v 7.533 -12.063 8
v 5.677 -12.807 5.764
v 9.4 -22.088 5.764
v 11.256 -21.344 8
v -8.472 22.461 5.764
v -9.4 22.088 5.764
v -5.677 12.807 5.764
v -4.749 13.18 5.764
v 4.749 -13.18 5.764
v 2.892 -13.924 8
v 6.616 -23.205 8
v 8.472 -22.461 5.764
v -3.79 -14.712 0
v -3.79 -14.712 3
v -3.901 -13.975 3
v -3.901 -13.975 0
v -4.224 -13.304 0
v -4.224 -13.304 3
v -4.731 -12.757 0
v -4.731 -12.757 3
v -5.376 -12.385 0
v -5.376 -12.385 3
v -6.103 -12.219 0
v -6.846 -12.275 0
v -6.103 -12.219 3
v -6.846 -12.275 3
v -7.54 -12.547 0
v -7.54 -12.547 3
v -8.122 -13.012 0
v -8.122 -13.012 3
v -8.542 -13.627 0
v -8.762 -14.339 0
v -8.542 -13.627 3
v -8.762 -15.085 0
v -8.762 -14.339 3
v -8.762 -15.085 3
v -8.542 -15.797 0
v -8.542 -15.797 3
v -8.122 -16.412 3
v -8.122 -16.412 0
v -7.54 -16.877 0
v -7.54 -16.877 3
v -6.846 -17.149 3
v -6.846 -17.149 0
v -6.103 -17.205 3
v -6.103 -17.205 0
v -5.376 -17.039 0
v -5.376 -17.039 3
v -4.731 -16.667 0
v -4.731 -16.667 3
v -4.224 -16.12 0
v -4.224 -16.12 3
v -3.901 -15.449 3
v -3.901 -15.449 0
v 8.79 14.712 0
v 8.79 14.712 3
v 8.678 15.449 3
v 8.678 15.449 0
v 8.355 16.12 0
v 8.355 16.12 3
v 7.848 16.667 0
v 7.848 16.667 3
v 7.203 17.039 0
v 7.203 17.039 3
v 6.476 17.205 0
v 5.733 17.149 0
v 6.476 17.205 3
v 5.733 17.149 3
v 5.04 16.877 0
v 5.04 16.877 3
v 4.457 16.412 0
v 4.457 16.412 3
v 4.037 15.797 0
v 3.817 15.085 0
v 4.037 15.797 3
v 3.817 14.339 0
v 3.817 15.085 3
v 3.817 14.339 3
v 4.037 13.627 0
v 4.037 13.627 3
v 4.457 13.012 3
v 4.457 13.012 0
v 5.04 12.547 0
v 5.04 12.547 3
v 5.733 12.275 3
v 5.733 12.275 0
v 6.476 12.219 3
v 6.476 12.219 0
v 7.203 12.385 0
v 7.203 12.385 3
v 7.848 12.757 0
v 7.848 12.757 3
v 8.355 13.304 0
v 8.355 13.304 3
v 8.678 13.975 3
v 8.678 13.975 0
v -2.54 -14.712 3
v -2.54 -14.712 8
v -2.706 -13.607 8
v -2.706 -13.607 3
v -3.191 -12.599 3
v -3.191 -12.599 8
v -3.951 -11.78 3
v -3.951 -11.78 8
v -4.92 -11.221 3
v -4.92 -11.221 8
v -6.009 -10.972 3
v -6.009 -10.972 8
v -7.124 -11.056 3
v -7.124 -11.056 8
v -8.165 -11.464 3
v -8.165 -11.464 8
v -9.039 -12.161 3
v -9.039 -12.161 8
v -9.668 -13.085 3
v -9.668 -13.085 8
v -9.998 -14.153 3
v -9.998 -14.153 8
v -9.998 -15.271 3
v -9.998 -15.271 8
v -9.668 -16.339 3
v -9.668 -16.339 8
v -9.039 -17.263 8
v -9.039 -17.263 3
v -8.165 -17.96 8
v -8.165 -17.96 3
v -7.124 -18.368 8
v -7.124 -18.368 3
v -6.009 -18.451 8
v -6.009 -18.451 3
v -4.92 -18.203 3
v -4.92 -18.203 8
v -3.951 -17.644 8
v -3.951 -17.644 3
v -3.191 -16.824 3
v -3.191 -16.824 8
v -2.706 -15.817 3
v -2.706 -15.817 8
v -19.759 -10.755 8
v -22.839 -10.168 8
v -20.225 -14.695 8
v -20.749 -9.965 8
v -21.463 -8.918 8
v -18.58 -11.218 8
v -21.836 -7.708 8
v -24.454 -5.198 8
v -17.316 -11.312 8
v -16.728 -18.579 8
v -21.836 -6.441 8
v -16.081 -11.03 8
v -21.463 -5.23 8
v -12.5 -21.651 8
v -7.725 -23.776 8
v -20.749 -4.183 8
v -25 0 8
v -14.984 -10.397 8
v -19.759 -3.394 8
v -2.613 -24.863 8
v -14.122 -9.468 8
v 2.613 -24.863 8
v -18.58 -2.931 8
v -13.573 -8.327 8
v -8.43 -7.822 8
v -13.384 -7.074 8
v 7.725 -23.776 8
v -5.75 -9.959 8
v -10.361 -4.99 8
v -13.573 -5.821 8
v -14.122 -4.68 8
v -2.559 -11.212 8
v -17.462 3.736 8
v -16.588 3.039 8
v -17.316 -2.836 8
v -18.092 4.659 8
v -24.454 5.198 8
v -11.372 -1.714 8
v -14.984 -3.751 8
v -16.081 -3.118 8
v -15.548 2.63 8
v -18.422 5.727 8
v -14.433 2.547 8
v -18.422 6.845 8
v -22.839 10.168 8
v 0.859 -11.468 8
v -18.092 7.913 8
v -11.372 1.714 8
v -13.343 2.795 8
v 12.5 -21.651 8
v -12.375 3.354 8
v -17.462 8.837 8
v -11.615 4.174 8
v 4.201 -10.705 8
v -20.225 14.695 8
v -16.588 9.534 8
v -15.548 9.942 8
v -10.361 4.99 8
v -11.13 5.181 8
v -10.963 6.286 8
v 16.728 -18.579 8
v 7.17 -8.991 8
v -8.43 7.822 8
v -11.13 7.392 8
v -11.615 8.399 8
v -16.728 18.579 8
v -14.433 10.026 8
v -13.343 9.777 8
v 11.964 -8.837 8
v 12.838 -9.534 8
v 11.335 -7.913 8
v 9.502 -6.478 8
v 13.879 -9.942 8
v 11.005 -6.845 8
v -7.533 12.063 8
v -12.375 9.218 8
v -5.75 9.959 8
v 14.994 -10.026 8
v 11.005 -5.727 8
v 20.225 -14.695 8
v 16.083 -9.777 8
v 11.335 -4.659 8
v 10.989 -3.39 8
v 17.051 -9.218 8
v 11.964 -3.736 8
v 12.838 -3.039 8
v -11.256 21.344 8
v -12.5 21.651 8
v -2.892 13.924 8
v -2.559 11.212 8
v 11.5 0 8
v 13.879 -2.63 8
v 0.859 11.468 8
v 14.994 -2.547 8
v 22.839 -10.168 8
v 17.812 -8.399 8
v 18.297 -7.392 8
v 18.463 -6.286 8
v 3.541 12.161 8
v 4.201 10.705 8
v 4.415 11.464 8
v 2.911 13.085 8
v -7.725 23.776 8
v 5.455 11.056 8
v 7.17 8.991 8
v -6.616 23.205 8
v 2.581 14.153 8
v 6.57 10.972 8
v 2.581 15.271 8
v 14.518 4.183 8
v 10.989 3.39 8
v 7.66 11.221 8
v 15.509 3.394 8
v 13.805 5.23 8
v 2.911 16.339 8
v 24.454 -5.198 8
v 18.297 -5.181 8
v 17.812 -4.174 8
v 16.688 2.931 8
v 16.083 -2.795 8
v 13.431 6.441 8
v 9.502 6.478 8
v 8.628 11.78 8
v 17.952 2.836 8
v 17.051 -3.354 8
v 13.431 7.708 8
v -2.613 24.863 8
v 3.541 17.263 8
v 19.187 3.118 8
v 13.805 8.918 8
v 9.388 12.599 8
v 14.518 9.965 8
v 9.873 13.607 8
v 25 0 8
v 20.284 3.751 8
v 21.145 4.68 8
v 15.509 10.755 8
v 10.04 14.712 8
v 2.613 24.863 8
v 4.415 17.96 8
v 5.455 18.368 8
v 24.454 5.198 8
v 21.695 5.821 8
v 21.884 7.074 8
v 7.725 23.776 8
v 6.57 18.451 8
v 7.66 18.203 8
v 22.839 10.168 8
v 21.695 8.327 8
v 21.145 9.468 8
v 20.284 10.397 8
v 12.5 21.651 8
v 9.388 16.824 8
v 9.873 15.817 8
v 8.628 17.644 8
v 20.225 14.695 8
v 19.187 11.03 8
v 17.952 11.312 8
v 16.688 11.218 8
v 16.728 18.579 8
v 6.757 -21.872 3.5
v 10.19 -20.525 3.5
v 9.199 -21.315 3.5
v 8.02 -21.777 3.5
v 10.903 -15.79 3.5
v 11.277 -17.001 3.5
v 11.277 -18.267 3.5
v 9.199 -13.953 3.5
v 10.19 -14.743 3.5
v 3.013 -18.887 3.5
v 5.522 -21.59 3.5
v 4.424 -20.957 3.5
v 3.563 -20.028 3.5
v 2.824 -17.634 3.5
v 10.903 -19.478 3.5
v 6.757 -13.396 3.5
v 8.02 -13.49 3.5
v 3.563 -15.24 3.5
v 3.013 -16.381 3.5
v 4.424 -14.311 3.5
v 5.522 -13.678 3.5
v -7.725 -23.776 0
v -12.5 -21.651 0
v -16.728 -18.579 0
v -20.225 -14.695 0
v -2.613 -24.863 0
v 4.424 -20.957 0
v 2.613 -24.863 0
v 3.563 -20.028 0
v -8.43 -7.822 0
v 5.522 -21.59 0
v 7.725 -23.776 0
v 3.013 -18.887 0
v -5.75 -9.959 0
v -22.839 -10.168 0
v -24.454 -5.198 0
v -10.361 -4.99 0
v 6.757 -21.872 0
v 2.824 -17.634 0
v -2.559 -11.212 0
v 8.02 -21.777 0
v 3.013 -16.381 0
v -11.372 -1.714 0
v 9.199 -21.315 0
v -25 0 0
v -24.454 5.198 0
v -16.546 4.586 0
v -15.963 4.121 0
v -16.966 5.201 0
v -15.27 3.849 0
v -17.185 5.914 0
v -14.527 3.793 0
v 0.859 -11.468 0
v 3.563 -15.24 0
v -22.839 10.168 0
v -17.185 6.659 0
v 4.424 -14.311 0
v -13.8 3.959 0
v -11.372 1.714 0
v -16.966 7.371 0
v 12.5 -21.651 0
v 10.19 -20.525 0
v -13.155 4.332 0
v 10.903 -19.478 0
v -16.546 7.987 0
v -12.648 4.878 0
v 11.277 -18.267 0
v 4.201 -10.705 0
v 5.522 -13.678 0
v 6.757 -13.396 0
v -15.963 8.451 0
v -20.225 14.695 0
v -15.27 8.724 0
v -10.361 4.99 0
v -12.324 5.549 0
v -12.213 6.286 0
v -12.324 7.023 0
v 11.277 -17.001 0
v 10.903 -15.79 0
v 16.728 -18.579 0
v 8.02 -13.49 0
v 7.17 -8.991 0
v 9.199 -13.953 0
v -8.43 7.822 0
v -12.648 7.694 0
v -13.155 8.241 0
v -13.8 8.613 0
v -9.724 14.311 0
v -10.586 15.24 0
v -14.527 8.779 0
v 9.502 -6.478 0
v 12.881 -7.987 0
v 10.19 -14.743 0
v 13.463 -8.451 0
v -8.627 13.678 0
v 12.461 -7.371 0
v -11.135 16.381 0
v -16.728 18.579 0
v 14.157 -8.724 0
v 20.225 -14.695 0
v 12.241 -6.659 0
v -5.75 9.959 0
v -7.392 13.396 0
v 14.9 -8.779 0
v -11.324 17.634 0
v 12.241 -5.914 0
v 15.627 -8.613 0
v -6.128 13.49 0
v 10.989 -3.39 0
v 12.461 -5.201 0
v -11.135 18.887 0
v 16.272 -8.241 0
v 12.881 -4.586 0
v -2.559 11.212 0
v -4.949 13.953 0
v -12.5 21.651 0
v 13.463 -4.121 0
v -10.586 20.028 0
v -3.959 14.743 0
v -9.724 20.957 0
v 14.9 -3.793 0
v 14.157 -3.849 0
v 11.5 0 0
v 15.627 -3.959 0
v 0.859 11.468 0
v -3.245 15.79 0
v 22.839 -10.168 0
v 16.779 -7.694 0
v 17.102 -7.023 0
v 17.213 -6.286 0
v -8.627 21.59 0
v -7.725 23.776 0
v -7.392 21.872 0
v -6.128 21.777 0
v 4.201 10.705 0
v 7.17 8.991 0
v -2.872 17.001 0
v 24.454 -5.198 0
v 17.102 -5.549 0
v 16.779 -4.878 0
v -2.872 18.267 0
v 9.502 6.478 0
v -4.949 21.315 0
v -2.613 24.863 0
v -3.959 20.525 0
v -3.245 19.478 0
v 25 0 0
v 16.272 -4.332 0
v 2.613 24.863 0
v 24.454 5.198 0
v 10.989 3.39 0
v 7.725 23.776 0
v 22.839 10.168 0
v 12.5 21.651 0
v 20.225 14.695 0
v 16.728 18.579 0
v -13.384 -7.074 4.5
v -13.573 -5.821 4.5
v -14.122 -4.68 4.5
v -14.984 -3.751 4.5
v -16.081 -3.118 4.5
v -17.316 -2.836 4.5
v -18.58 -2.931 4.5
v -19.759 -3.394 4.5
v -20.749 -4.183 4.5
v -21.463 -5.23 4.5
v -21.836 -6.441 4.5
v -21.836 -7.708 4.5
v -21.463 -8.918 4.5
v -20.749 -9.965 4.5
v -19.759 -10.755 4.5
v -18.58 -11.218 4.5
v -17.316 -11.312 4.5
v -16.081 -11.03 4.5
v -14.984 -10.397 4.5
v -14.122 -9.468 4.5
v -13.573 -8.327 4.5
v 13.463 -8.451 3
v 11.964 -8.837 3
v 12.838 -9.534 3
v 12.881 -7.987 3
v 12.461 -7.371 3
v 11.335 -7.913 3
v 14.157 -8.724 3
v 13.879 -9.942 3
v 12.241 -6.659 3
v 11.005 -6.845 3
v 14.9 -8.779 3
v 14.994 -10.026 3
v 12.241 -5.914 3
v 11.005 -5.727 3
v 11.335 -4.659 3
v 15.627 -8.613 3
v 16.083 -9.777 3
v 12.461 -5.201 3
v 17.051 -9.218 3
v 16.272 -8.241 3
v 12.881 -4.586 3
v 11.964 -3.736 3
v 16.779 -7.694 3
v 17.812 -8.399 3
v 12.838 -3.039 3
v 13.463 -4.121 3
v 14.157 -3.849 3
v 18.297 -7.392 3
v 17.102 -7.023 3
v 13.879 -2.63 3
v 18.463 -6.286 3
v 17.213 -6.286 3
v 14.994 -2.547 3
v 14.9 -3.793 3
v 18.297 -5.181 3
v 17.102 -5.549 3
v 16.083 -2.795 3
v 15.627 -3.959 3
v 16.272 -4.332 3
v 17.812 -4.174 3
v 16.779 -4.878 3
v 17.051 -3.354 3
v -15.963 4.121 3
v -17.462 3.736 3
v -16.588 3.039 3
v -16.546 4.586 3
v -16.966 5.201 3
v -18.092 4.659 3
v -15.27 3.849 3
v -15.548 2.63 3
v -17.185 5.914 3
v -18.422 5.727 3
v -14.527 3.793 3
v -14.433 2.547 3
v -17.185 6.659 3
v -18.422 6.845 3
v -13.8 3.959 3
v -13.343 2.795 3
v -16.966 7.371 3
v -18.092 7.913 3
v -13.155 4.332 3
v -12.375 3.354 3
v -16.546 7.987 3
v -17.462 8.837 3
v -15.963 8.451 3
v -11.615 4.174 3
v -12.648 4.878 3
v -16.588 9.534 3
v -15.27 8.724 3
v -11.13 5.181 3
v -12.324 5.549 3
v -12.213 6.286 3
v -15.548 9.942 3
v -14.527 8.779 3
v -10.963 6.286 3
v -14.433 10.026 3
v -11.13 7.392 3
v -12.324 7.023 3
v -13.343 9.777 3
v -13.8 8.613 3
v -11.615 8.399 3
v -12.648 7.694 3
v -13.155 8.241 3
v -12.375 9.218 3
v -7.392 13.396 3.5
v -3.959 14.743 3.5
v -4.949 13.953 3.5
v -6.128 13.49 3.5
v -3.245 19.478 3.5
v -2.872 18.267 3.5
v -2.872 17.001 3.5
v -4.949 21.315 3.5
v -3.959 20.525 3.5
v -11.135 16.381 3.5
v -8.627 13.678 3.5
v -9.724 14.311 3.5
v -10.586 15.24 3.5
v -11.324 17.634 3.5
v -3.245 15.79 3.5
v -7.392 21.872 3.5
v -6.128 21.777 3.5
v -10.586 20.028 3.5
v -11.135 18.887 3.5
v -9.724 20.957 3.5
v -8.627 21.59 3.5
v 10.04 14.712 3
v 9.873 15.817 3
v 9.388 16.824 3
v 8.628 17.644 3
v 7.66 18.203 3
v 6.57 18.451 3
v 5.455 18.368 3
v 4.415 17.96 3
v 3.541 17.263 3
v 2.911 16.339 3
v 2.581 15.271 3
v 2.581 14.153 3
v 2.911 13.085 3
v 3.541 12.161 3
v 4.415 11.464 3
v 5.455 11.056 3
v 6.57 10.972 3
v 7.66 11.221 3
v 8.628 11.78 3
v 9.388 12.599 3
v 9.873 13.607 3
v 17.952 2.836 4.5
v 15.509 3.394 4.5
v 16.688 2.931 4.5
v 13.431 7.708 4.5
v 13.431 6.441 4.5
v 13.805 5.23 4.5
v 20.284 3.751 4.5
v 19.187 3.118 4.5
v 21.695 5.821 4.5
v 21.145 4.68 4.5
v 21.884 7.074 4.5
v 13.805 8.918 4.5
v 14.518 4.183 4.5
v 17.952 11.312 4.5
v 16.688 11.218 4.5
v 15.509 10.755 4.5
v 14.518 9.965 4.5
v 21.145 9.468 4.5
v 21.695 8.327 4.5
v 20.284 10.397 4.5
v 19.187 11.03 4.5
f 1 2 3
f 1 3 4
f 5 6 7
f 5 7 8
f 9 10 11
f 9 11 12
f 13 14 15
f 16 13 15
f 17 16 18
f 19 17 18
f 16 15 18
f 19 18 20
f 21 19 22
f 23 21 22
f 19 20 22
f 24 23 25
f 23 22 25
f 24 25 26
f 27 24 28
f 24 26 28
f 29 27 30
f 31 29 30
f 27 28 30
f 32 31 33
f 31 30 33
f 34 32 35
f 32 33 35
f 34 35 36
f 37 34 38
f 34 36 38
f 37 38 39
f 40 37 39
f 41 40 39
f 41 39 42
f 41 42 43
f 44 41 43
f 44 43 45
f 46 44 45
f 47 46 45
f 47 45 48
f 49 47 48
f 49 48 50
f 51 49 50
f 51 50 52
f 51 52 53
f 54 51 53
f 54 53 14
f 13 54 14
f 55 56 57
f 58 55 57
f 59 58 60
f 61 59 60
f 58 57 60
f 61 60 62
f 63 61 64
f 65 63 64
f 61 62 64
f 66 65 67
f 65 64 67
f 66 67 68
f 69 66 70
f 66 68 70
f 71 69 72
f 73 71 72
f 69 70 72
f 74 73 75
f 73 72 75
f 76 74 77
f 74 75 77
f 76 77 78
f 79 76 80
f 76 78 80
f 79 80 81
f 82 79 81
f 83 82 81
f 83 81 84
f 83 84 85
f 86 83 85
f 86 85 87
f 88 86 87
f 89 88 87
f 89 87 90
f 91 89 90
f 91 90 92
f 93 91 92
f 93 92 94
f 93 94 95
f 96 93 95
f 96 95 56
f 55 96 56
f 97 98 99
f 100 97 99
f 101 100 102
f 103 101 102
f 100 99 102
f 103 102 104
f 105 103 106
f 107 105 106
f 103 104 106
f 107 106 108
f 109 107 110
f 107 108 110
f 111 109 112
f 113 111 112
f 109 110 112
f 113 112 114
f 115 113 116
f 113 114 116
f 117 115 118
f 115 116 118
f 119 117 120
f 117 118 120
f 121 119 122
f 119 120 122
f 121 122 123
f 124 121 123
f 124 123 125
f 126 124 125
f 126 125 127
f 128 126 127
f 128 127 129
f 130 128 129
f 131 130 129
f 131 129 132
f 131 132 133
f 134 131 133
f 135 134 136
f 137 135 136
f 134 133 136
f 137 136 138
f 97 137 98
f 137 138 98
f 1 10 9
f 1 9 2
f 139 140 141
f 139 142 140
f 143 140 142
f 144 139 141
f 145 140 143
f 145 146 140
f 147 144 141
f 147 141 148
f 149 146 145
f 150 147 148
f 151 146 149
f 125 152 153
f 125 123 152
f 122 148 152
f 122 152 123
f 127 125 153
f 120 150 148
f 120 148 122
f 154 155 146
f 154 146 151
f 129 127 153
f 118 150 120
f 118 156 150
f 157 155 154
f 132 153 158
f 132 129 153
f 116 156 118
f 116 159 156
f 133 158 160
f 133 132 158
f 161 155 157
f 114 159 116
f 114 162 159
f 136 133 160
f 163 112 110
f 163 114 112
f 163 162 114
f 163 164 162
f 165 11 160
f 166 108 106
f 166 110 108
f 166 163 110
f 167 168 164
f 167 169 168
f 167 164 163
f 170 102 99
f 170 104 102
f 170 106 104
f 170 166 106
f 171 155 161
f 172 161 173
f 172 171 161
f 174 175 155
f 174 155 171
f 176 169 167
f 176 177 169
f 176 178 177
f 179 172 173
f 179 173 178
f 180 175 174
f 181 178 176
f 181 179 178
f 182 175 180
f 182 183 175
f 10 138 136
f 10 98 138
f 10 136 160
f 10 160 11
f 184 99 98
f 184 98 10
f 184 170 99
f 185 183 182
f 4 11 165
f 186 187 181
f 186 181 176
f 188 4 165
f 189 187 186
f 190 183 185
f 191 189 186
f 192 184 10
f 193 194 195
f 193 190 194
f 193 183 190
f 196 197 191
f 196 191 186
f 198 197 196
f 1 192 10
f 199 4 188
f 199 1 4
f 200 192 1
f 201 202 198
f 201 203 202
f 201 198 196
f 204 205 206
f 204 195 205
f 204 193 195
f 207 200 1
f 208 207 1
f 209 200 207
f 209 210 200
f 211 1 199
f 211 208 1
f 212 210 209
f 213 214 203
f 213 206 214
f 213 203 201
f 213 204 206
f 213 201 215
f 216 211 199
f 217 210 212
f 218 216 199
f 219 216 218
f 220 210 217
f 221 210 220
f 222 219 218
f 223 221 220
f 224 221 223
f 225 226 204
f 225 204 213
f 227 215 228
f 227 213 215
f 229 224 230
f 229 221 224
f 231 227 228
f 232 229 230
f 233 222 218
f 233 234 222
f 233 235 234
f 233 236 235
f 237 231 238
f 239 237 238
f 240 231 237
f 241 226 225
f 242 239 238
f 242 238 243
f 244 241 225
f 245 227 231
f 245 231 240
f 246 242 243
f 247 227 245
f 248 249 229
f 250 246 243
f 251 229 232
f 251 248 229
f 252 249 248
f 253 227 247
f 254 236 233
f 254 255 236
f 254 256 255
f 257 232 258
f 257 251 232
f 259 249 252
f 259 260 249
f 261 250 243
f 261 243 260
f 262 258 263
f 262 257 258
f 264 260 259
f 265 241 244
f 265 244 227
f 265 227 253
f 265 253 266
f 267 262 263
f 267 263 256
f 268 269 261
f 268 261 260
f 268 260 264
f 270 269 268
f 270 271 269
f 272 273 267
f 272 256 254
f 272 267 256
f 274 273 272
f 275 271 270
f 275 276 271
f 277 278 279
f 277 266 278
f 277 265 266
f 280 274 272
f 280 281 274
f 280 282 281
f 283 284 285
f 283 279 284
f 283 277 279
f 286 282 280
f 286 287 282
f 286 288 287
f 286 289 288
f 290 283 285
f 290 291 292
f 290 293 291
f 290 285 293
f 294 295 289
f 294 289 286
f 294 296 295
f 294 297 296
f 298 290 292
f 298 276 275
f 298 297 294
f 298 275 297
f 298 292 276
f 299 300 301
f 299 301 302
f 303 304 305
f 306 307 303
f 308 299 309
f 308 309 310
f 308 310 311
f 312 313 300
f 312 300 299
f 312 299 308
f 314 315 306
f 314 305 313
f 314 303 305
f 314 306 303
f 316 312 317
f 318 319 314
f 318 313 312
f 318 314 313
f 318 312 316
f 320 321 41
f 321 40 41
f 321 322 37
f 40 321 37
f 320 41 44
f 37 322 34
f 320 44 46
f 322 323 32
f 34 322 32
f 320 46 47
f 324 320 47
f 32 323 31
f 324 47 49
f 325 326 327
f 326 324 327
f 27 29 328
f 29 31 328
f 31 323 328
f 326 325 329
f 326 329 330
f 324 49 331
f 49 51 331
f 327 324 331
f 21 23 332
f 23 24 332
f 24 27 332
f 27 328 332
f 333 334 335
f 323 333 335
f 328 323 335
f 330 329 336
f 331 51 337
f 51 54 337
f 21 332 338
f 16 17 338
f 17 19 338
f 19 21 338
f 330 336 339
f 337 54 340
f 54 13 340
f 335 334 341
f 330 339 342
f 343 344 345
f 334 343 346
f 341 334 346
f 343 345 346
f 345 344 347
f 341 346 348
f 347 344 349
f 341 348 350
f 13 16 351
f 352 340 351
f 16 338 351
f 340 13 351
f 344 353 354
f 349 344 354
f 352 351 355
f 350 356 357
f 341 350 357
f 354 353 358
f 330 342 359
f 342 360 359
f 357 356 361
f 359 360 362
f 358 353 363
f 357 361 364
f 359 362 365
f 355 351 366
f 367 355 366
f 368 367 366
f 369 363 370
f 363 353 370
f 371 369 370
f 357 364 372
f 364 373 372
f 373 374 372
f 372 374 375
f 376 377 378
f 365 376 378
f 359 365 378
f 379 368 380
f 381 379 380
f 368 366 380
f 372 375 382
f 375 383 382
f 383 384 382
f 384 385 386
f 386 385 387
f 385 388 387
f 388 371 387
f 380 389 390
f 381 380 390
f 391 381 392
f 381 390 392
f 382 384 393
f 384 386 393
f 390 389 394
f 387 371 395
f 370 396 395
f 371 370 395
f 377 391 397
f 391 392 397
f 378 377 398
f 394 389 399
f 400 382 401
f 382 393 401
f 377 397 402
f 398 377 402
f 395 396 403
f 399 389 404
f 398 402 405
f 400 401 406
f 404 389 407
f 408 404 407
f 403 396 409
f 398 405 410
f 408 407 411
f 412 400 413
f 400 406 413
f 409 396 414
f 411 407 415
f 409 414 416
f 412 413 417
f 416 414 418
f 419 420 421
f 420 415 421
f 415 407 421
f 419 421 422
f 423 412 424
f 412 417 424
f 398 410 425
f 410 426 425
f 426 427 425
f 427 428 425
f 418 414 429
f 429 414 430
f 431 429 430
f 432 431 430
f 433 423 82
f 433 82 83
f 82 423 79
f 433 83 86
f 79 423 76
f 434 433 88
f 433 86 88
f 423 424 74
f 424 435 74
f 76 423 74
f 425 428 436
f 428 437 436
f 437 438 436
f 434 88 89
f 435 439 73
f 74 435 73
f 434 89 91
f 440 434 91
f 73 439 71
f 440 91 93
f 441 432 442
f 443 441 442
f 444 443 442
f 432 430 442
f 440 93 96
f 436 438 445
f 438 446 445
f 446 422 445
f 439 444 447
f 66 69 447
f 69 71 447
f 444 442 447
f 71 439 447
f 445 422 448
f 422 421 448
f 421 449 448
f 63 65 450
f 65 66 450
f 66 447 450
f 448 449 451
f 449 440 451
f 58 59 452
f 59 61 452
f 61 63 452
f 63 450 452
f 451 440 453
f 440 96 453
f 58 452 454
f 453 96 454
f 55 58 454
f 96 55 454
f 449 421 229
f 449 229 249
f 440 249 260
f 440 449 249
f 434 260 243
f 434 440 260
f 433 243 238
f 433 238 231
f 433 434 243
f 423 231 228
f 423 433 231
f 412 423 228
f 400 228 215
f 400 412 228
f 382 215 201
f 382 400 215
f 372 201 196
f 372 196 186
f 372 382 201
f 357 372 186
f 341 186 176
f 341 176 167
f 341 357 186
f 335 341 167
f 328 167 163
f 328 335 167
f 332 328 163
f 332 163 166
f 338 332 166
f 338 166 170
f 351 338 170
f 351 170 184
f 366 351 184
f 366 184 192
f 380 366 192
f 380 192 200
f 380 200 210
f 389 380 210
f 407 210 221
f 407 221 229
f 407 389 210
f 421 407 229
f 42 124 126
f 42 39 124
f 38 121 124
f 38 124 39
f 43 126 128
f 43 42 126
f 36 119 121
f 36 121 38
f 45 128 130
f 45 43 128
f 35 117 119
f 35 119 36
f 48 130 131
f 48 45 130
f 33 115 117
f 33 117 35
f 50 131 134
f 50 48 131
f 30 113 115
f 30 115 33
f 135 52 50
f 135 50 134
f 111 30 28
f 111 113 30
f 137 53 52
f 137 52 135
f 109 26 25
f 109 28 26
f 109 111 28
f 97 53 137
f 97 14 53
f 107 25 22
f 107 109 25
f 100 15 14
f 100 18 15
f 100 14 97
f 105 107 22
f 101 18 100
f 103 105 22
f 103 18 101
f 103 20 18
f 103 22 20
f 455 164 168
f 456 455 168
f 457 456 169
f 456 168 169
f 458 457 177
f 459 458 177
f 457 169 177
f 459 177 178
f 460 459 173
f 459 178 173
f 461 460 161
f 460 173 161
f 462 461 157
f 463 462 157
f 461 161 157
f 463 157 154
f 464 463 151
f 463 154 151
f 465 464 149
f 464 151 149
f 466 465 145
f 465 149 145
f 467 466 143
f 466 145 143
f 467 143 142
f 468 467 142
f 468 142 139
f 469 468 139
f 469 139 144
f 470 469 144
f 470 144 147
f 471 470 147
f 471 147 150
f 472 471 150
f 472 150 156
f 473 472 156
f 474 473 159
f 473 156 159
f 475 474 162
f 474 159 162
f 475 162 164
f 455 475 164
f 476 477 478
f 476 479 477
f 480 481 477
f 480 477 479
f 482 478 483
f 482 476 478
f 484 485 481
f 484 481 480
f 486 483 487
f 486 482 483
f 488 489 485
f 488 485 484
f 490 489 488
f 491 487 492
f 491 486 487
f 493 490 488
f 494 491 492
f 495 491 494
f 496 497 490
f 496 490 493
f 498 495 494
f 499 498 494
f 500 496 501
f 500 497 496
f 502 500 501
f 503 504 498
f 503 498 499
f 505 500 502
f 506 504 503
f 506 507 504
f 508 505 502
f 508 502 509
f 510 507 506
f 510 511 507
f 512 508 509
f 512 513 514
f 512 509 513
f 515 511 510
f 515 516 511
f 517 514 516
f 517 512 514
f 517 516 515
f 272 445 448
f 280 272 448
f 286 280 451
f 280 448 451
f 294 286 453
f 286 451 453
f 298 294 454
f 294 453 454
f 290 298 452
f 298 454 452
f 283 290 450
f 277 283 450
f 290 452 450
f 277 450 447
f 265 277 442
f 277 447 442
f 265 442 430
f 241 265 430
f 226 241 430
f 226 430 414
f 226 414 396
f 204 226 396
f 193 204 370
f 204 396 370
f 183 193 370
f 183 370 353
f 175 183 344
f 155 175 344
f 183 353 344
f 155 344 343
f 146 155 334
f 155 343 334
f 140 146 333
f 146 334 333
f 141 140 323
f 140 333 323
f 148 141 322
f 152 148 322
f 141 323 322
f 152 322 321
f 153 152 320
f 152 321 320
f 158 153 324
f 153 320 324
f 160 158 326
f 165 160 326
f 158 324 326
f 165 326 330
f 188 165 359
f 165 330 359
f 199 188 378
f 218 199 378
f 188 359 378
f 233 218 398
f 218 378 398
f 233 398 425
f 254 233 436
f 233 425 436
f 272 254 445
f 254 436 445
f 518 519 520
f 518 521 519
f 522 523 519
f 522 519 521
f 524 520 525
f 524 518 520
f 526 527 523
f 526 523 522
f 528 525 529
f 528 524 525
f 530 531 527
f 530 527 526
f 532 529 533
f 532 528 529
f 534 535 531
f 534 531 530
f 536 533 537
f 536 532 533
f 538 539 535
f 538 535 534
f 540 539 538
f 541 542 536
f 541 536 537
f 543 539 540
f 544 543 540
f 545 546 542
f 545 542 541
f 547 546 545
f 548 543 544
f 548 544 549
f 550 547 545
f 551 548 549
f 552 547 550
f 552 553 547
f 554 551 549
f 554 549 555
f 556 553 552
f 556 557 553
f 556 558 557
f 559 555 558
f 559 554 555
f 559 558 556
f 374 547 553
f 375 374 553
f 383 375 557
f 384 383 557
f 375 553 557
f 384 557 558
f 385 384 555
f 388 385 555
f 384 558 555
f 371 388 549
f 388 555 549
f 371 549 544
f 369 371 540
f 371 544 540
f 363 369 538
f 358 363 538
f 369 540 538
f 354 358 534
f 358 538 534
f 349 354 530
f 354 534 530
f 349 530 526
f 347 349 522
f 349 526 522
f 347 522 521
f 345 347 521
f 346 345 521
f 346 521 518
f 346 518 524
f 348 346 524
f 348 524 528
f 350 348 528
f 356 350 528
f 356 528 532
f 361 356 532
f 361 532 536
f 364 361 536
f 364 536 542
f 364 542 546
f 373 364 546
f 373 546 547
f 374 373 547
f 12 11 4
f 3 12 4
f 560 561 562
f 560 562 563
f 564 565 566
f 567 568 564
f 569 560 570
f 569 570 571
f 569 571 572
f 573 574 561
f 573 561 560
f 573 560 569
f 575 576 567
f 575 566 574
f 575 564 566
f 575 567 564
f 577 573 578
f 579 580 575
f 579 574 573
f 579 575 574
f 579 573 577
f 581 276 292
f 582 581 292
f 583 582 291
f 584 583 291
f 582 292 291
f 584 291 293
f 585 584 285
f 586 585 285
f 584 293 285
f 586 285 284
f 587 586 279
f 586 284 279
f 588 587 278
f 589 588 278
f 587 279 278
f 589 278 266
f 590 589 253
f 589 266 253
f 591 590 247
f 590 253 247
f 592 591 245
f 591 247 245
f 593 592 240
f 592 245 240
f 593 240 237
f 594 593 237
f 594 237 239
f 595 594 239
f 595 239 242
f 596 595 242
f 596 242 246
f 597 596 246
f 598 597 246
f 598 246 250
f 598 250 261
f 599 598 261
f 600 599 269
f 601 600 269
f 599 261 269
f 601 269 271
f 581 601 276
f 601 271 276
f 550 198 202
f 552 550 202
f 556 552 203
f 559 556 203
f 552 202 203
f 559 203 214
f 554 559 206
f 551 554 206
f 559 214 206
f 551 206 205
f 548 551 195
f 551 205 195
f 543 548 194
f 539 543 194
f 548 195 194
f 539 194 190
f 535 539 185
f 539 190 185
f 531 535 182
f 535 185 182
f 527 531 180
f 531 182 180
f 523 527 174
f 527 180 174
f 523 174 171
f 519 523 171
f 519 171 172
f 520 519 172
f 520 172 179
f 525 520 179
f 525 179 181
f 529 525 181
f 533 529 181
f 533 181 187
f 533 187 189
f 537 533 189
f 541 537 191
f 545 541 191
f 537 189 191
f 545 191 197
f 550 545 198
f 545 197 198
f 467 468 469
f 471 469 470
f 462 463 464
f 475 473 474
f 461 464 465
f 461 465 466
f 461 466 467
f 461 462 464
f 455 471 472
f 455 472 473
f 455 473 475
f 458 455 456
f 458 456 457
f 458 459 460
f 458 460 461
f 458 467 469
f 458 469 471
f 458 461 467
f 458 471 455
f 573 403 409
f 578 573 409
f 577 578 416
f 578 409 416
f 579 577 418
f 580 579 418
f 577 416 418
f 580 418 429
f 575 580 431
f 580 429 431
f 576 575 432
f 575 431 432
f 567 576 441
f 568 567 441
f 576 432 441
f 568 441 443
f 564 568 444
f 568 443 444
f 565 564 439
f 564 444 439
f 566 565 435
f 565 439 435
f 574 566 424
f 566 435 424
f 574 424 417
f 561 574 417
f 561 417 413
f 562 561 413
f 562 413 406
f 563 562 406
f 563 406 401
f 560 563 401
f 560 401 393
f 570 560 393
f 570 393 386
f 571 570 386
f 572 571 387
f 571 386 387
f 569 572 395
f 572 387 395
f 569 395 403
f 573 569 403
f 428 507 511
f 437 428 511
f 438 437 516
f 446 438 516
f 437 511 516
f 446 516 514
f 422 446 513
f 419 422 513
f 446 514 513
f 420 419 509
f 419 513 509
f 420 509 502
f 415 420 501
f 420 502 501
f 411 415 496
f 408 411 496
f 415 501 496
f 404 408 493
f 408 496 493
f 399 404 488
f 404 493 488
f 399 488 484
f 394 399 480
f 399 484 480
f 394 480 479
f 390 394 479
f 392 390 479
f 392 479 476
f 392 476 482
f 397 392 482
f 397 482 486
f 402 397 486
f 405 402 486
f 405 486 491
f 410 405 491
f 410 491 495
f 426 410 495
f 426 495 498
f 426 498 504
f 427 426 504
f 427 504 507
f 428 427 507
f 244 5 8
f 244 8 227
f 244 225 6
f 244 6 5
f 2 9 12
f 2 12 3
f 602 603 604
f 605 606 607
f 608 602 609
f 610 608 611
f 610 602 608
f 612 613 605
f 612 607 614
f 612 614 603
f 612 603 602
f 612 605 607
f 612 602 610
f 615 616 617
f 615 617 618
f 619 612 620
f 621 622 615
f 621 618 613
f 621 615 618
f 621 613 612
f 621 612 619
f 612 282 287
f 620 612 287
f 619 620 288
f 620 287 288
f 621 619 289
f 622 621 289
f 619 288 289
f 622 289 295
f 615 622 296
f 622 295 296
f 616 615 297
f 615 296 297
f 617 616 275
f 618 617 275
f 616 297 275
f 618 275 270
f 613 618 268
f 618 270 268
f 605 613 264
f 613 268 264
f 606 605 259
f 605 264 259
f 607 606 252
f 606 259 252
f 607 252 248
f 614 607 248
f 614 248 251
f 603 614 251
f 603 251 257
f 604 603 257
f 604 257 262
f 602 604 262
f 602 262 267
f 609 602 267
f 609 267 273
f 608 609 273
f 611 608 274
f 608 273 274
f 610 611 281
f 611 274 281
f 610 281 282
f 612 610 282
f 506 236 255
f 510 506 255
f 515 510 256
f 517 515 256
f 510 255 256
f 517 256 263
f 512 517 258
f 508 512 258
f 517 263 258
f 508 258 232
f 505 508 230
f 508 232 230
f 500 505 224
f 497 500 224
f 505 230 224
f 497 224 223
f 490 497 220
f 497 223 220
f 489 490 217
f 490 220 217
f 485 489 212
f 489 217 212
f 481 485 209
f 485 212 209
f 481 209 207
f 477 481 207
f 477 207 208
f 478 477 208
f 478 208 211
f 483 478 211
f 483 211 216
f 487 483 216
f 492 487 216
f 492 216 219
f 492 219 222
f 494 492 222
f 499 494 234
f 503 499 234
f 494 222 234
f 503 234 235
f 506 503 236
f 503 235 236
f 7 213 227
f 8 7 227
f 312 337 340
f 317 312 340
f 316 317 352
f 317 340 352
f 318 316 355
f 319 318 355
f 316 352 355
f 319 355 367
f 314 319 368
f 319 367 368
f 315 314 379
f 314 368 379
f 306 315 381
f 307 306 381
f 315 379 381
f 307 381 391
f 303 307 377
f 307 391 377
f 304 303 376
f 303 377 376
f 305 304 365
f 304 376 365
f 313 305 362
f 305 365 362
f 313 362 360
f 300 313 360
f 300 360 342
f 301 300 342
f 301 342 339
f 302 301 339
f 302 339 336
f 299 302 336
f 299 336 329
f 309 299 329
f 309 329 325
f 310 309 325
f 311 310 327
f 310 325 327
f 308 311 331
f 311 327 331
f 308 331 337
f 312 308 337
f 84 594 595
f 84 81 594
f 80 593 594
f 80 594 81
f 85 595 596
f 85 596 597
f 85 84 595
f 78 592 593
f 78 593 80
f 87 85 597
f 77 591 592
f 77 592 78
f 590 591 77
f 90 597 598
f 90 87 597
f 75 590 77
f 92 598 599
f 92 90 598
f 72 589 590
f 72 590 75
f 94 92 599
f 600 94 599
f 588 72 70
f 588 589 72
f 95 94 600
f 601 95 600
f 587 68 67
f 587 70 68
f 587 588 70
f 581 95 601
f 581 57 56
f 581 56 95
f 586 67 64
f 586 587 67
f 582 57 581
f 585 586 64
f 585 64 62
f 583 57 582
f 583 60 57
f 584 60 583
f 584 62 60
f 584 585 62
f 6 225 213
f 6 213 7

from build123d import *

# Parameters (mm, degrees)
ESQUISSE1_R             = 25
ESQUISSE1_R_2           = 11.5
BOSS_EXTRU_1_DEPTH      = 8
ESQUISSE2_R             = 2.5
ENL_V_MAT_EXTRU_1_DEPTH = 37.249137921
ESQUISSE4_R             = 3.75
ENL_V_MAT_EXTRU_2_DEPTH = 5
ENL_V_START             = -14
ENL_V_MAT_EXTRU_7_DEPTH = 10
ESQUISSE10_R            = 4.25
ENL_V_MAT_EXTRU_5_DEPTH = 3.5
ESQUISSE12_R            = 4.25
ENL_V_MAT_EXTRU_6_DEPTH = 3.5


with BuildPart() as part:
    # Esquisse1 → Boss.-Extru.1 (new body)
    with BuildSketch(Plane.XY):
        Circle(ESQUISSE1_R)
        Circle(ESQUISSE1_R_2, mode=Mode.SUBTRACT)
    extrude(amount=BOSS_EXTRU_1_DEPTH)

    # Esquisse2 → Enlèv. mat.-Extru.1 (cut, through all)
    with BuildSketch(Plane.XY.offset(8)):
        with Locations((-14.713385832, 6.286197369)):
            Circle(ESQUISSE2_R)
        with Locations((6.28955657, 14.711950182)):
            Circle(ESQUISSE2_R)
        with Locations((14.713385832, -6.286197369)):
            Circle(ESQUISSE2_R)
        with Locations((-6.28955657, -14.711950182)):
            Circle(ESQUISSE2_R)
    extrude(amount=-ENL_V_MAT_EXTRU_1_DEPTH, mode=Mode.SUBTRACT)

    # Esquisse4 → Enlèv. mat.-Extru.2 (cut)
    with BuildSketch(Plane.XY.offset(8)):
        with Locations((-6.28955657, -14.711950182)):
            Circle(ESQUISSE4_R)
        with Locations((14.713385832, -6.286197369)):
            Circle(ESQUISSE4_R)
        with Locations((6.28955657, 14.711950182)):
            Circle(ESQUISSE4_R)
        with Locations((-14.713385832, 6.286197369)):
            Circle(ESQUISSE4_R)
    extrude(amount=-ENL_V_MAT_EXTRU_2_DEPTH, mode=Mode.SUBTRACT)

    # Esquisse13 → Enlèv. mat.-Extru.7 (cut)
    with BuildSketch(Plane(origin=(0, 0, 0), x_dir=(-0.9281017411356184, -0.3723266819622707, 0), z_dir=(-0.3723266819622707, 0.9281017411356184, 0)).offset(ENL_V_START)):
        Polygon((-2.5, 8), (2.5, 8), (0.5, 5.763932023), (-0.5, 5.763932023), align=None)
    enl_v_mat_extru_7 = extrude(amount=-ENL_V_MAT_EXTRU_7_DEPTH, mode=Mode.SUBTRACT)

    # Esquisse10 → Enlèv. mat.-Extru.5 (cut)
    with BuildSketch(Plane(origin=(0, 0, 0), x_dir=(-1, 0, 0), z_dir=(0, 0, -1))):
        with Locations((7.074206957, 17.633933082)):
            Circle(ESQUISSE10_R)
        with Locations((-7.074206957, -17.633933082)):
            Circle(ESQUISSE10_R)
    extrude(amount=-ENL_V_MAT_EXTRU_5_DEPTH, mode=Mode.SUBTRACT)

    # Esquisse12 → Enlèv. mat.-Extru.6 (cut)
    with BuildSketch(Plane.XY.offset(8)):
        with Locations((17.633933082, 7.074206957)):
            Circle(ESQUISSE12_R)
        with Locations((-17.633933082, -7.074206957)):
            Circle(ESQUISSE12_R)
    extrude(amount=-ENL_V_MAT_EXTRU_6_DEPTH, mode=Mode.SUBTRACT)

    # Symétrie1: Enlèv. mat.-Extru.7 across plane
    add(enl_v_mat_extru_7.mirror(Plane(origin=(0, 0, 0), x_dir=(0, 0, 1), z_dir=(-0.3723266819622707, 0.9281017411356184, 0))), mode=Mode.SUBTRACT)


solid = part.part
